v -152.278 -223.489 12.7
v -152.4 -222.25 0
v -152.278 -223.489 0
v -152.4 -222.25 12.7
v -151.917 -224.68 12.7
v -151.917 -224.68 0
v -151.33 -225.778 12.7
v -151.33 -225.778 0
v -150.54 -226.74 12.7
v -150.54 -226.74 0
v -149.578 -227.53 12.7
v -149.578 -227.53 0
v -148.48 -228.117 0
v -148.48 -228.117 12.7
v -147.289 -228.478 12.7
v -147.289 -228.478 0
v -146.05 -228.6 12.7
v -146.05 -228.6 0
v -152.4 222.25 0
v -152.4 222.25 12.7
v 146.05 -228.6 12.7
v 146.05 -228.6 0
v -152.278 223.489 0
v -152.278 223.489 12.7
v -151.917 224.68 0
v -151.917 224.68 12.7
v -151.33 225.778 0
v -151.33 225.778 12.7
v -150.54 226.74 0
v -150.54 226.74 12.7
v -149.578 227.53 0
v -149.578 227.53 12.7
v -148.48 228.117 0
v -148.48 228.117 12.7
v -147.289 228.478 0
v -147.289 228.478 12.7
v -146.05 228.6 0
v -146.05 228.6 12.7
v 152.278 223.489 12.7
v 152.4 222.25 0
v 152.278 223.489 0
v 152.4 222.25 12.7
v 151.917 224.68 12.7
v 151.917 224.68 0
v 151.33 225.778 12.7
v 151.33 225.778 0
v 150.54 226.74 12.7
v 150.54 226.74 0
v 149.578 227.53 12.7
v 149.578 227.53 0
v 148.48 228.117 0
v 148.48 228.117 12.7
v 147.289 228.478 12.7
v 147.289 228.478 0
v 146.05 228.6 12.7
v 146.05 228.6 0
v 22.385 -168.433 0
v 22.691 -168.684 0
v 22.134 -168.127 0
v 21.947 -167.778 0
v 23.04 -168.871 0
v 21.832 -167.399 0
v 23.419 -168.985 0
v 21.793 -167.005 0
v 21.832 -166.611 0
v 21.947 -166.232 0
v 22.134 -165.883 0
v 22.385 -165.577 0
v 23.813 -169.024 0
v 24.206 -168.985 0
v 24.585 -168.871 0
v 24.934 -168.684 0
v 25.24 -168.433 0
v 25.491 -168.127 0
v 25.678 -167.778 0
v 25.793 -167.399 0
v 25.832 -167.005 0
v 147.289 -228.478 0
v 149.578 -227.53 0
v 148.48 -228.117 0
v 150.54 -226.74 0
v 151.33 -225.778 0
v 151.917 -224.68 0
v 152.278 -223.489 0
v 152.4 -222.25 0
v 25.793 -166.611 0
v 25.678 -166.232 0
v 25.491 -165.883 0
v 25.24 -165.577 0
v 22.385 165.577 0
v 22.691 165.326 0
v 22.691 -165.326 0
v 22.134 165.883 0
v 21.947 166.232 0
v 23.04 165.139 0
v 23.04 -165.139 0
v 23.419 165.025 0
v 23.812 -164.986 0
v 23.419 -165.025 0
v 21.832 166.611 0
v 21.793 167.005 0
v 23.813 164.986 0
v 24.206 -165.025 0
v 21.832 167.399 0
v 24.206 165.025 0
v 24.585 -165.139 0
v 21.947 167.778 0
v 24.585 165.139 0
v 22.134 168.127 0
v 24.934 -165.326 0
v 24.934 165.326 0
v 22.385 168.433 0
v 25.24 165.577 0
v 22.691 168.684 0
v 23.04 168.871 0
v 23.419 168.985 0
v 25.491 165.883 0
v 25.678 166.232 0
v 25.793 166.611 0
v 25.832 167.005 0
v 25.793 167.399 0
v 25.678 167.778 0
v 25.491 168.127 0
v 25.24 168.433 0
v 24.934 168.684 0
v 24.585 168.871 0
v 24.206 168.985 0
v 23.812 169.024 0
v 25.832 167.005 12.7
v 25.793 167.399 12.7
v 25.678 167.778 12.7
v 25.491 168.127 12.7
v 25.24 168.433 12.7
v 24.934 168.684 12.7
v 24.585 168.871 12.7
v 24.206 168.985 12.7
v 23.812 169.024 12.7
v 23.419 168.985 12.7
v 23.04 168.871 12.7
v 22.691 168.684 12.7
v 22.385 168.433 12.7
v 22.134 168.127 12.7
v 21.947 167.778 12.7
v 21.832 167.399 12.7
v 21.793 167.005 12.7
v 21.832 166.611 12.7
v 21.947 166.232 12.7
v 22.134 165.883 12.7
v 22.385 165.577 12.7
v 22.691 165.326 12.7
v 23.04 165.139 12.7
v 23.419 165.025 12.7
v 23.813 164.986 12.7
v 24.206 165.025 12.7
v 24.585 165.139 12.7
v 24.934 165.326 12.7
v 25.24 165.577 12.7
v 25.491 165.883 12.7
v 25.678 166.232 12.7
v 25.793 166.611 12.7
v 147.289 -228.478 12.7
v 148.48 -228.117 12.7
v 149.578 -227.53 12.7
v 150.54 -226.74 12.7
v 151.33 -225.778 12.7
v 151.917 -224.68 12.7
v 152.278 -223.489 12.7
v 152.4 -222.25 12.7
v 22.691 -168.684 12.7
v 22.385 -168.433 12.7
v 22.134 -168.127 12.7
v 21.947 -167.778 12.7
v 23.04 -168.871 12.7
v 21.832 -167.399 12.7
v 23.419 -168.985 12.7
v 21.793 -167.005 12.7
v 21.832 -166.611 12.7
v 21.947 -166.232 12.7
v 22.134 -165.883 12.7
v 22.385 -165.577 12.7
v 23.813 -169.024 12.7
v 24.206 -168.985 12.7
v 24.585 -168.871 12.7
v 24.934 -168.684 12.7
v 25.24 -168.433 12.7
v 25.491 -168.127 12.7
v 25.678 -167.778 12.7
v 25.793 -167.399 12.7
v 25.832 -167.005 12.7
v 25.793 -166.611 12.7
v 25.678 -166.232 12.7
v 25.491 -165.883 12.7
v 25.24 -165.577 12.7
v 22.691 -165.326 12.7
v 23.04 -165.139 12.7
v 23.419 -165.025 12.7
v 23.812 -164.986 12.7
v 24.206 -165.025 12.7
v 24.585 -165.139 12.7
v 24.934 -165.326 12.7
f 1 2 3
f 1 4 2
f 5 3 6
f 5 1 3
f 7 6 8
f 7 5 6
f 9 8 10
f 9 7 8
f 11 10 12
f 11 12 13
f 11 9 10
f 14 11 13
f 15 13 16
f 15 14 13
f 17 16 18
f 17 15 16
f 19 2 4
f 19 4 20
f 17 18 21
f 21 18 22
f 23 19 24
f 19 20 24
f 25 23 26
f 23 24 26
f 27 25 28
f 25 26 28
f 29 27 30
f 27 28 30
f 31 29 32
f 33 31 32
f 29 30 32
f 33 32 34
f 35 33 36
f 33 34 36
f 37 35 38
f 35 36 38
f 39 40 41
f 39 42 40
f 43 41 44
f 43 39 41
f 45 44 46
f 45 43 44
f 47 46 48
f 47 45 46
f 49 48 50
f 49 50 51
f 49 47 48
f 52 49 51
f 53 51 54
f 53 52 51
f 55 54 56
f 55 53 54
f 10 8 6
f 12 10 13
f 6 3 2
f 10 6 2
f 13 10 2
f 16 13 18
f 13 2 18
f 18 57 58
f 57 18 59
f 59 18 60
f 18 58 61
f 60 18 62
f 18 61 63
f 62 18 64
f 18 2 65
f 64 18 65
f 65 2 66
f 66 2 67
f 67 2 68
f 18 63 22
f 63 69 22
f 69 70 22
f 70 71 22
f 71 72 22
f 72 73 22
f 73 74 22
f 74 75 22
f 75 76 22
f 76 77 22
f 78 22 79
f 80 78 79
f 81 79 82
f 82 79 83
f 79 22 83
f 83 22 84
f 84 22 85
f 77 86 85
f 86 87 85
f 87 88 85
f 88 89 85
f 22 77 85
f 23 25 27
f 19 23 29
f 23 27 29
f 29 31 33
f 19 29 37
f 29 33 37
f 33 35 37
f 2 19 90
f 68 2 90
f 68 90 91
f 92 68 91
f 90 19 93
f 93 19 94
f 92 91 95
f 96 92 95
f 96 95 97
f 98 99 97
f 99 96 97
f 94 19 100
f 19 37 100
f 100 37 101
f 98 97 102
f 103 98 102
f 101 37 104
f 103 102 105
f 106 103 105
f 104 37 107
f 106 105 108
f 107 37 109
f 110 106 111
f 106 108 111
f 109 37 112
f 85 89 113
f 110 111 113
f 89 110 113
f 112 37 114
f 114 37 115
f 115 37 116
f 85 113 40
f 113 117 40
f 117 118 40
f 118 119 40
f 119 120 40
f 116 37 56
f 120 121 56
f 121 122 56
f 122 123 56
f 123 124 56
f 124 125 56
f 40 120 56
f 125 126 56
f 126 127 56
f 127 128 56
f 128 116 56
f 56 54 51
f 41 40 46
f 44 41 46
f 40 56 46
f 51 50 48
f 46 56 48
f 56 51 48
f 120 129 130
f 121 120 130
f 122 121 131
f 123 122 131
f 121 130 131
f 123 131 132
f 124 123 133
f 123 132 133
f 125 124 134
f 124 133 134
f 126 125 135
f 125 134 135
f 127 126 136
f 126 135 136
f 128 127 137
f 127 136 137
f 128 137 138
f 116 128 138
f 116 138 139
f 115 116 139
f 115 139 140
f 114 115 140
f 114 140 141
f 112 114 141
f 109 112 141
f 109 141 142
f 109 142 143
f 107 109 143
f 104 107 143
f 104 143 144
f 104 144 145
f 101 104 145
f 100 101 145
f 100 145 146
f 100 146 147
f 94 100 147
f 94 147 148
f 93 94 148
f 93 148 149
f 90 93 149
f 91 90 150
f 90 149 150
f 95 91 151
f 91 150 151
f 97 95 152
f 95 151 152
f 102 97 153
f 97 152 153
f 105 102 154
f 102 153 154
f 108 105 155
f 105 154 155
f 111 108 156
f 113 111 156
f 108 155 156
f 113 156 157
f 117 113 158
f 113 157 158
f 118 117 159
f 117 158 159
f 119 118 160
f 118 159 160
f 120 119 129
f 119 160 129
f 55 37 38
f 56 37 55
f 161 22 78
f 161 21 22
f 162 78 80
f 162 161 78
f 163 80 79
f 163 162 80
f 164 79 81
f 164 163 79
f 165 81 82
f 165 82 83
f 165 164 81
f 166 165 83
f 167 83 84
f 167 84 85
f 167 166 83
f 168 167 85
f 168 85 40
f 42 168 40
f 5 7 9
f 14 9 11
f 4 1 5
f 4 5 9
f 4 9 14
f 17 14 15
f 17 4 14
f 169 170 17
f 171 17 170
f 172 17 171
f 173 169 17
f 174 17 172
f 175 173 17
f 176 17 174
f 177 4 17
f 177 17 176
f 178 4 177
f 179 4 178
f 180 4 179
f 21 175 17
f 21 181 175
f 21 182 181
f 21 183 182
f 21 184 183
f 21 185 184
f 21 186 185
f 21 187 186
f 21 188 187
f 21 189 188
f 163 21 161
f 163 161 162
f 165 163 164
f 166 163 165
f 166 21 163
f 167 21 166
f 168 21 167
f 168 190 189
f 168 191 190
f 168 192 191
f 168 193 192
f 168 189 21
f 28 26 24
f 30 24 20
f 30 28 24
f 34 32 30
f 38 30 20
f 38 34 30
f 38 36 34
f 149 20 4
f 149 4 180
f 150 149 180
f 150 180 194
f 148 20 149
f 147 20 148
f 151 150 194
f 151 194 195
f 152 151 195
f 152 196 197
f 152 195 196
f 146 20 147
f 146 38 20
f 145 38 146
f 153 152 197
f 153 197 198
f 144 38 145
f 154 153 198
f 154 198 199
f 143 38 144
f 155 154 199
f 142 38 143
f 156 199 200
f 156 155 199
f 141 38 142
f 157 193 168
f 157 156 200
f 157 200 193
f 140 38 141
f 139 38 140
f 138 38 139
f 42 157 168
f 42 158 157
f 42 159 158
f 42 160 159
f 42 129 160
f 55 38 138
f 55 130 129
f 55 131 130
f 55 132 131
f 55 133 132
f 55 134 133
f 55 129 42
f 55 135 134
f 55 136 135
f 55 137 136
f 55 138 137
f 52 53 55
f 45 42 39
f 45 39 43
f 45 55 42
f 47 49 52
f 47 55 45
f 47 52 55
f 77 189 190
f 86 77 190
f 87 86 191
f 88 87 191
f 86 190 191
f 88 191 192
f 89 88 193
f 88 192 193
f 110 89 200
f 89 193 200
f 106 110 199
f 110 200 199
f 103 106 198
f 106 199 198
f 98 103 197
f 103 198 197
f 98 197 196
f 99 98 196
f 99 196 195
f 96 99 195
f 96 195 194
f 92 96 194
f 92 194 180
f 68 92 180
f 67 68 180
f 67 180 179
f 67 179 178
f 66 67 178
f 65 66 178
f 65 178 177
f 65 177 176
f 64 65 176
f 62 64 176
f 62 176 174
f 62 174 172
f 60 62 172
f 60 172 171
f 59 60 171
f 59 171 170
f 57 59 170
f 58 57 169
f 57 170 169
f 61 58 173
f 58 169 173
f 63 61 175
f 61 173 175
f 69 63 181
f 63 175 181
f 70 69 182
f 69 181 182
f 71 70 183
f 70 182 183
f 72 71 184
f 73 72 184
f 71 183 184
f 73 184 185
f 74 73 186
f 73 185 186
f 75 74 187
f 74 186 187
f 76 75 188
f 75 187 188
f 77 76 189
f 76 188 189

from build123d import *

# Parameters (mm, degrees)
SKETCH2_W              = 304.8
SKETCH2_H              = 457.2
BOSS_EXTRUDE1_DEPTH    = 12.7
FILLET1_R              = 6.35
F_10_32_TAPPED_HOLE1_D = 4.0386


with BuildPart() as part:
    # Sketch2 → Boss-Extrude1 (new body)
    with BuildSketch(Plane.XY):
        Rectangle(SKETCH2_W, SKETCH2_H)
    extrude(amount=BOSS_EXTRUDE1_DEPTH)

    # Fillet1
    fillet1_edges = [part.edges().sort_by_distance(p)[0] for p in [
        (152.4, -228.6, 6.35),
        (-152.4, -228.6, 6.35),
        (-152.4, 228.6, 6.35),
        (152.4, 228.6, 6.35),
    ]]
    fillet(fillet1_edges, radius=FILLET1_R)

    # #10-32 Tapped Hole1 (through all)
    with Locations(Plane(origin=(0, 0, 0), x_dir=(-1, 0, 0), z_dir=(0, 0, -1))):
        with Locations((-23.8125, -167.005), (-23.8125, 167.005)):
            Hole(F_10_32_TAPPED_HOLE1_D / 2)


solid = part.part
